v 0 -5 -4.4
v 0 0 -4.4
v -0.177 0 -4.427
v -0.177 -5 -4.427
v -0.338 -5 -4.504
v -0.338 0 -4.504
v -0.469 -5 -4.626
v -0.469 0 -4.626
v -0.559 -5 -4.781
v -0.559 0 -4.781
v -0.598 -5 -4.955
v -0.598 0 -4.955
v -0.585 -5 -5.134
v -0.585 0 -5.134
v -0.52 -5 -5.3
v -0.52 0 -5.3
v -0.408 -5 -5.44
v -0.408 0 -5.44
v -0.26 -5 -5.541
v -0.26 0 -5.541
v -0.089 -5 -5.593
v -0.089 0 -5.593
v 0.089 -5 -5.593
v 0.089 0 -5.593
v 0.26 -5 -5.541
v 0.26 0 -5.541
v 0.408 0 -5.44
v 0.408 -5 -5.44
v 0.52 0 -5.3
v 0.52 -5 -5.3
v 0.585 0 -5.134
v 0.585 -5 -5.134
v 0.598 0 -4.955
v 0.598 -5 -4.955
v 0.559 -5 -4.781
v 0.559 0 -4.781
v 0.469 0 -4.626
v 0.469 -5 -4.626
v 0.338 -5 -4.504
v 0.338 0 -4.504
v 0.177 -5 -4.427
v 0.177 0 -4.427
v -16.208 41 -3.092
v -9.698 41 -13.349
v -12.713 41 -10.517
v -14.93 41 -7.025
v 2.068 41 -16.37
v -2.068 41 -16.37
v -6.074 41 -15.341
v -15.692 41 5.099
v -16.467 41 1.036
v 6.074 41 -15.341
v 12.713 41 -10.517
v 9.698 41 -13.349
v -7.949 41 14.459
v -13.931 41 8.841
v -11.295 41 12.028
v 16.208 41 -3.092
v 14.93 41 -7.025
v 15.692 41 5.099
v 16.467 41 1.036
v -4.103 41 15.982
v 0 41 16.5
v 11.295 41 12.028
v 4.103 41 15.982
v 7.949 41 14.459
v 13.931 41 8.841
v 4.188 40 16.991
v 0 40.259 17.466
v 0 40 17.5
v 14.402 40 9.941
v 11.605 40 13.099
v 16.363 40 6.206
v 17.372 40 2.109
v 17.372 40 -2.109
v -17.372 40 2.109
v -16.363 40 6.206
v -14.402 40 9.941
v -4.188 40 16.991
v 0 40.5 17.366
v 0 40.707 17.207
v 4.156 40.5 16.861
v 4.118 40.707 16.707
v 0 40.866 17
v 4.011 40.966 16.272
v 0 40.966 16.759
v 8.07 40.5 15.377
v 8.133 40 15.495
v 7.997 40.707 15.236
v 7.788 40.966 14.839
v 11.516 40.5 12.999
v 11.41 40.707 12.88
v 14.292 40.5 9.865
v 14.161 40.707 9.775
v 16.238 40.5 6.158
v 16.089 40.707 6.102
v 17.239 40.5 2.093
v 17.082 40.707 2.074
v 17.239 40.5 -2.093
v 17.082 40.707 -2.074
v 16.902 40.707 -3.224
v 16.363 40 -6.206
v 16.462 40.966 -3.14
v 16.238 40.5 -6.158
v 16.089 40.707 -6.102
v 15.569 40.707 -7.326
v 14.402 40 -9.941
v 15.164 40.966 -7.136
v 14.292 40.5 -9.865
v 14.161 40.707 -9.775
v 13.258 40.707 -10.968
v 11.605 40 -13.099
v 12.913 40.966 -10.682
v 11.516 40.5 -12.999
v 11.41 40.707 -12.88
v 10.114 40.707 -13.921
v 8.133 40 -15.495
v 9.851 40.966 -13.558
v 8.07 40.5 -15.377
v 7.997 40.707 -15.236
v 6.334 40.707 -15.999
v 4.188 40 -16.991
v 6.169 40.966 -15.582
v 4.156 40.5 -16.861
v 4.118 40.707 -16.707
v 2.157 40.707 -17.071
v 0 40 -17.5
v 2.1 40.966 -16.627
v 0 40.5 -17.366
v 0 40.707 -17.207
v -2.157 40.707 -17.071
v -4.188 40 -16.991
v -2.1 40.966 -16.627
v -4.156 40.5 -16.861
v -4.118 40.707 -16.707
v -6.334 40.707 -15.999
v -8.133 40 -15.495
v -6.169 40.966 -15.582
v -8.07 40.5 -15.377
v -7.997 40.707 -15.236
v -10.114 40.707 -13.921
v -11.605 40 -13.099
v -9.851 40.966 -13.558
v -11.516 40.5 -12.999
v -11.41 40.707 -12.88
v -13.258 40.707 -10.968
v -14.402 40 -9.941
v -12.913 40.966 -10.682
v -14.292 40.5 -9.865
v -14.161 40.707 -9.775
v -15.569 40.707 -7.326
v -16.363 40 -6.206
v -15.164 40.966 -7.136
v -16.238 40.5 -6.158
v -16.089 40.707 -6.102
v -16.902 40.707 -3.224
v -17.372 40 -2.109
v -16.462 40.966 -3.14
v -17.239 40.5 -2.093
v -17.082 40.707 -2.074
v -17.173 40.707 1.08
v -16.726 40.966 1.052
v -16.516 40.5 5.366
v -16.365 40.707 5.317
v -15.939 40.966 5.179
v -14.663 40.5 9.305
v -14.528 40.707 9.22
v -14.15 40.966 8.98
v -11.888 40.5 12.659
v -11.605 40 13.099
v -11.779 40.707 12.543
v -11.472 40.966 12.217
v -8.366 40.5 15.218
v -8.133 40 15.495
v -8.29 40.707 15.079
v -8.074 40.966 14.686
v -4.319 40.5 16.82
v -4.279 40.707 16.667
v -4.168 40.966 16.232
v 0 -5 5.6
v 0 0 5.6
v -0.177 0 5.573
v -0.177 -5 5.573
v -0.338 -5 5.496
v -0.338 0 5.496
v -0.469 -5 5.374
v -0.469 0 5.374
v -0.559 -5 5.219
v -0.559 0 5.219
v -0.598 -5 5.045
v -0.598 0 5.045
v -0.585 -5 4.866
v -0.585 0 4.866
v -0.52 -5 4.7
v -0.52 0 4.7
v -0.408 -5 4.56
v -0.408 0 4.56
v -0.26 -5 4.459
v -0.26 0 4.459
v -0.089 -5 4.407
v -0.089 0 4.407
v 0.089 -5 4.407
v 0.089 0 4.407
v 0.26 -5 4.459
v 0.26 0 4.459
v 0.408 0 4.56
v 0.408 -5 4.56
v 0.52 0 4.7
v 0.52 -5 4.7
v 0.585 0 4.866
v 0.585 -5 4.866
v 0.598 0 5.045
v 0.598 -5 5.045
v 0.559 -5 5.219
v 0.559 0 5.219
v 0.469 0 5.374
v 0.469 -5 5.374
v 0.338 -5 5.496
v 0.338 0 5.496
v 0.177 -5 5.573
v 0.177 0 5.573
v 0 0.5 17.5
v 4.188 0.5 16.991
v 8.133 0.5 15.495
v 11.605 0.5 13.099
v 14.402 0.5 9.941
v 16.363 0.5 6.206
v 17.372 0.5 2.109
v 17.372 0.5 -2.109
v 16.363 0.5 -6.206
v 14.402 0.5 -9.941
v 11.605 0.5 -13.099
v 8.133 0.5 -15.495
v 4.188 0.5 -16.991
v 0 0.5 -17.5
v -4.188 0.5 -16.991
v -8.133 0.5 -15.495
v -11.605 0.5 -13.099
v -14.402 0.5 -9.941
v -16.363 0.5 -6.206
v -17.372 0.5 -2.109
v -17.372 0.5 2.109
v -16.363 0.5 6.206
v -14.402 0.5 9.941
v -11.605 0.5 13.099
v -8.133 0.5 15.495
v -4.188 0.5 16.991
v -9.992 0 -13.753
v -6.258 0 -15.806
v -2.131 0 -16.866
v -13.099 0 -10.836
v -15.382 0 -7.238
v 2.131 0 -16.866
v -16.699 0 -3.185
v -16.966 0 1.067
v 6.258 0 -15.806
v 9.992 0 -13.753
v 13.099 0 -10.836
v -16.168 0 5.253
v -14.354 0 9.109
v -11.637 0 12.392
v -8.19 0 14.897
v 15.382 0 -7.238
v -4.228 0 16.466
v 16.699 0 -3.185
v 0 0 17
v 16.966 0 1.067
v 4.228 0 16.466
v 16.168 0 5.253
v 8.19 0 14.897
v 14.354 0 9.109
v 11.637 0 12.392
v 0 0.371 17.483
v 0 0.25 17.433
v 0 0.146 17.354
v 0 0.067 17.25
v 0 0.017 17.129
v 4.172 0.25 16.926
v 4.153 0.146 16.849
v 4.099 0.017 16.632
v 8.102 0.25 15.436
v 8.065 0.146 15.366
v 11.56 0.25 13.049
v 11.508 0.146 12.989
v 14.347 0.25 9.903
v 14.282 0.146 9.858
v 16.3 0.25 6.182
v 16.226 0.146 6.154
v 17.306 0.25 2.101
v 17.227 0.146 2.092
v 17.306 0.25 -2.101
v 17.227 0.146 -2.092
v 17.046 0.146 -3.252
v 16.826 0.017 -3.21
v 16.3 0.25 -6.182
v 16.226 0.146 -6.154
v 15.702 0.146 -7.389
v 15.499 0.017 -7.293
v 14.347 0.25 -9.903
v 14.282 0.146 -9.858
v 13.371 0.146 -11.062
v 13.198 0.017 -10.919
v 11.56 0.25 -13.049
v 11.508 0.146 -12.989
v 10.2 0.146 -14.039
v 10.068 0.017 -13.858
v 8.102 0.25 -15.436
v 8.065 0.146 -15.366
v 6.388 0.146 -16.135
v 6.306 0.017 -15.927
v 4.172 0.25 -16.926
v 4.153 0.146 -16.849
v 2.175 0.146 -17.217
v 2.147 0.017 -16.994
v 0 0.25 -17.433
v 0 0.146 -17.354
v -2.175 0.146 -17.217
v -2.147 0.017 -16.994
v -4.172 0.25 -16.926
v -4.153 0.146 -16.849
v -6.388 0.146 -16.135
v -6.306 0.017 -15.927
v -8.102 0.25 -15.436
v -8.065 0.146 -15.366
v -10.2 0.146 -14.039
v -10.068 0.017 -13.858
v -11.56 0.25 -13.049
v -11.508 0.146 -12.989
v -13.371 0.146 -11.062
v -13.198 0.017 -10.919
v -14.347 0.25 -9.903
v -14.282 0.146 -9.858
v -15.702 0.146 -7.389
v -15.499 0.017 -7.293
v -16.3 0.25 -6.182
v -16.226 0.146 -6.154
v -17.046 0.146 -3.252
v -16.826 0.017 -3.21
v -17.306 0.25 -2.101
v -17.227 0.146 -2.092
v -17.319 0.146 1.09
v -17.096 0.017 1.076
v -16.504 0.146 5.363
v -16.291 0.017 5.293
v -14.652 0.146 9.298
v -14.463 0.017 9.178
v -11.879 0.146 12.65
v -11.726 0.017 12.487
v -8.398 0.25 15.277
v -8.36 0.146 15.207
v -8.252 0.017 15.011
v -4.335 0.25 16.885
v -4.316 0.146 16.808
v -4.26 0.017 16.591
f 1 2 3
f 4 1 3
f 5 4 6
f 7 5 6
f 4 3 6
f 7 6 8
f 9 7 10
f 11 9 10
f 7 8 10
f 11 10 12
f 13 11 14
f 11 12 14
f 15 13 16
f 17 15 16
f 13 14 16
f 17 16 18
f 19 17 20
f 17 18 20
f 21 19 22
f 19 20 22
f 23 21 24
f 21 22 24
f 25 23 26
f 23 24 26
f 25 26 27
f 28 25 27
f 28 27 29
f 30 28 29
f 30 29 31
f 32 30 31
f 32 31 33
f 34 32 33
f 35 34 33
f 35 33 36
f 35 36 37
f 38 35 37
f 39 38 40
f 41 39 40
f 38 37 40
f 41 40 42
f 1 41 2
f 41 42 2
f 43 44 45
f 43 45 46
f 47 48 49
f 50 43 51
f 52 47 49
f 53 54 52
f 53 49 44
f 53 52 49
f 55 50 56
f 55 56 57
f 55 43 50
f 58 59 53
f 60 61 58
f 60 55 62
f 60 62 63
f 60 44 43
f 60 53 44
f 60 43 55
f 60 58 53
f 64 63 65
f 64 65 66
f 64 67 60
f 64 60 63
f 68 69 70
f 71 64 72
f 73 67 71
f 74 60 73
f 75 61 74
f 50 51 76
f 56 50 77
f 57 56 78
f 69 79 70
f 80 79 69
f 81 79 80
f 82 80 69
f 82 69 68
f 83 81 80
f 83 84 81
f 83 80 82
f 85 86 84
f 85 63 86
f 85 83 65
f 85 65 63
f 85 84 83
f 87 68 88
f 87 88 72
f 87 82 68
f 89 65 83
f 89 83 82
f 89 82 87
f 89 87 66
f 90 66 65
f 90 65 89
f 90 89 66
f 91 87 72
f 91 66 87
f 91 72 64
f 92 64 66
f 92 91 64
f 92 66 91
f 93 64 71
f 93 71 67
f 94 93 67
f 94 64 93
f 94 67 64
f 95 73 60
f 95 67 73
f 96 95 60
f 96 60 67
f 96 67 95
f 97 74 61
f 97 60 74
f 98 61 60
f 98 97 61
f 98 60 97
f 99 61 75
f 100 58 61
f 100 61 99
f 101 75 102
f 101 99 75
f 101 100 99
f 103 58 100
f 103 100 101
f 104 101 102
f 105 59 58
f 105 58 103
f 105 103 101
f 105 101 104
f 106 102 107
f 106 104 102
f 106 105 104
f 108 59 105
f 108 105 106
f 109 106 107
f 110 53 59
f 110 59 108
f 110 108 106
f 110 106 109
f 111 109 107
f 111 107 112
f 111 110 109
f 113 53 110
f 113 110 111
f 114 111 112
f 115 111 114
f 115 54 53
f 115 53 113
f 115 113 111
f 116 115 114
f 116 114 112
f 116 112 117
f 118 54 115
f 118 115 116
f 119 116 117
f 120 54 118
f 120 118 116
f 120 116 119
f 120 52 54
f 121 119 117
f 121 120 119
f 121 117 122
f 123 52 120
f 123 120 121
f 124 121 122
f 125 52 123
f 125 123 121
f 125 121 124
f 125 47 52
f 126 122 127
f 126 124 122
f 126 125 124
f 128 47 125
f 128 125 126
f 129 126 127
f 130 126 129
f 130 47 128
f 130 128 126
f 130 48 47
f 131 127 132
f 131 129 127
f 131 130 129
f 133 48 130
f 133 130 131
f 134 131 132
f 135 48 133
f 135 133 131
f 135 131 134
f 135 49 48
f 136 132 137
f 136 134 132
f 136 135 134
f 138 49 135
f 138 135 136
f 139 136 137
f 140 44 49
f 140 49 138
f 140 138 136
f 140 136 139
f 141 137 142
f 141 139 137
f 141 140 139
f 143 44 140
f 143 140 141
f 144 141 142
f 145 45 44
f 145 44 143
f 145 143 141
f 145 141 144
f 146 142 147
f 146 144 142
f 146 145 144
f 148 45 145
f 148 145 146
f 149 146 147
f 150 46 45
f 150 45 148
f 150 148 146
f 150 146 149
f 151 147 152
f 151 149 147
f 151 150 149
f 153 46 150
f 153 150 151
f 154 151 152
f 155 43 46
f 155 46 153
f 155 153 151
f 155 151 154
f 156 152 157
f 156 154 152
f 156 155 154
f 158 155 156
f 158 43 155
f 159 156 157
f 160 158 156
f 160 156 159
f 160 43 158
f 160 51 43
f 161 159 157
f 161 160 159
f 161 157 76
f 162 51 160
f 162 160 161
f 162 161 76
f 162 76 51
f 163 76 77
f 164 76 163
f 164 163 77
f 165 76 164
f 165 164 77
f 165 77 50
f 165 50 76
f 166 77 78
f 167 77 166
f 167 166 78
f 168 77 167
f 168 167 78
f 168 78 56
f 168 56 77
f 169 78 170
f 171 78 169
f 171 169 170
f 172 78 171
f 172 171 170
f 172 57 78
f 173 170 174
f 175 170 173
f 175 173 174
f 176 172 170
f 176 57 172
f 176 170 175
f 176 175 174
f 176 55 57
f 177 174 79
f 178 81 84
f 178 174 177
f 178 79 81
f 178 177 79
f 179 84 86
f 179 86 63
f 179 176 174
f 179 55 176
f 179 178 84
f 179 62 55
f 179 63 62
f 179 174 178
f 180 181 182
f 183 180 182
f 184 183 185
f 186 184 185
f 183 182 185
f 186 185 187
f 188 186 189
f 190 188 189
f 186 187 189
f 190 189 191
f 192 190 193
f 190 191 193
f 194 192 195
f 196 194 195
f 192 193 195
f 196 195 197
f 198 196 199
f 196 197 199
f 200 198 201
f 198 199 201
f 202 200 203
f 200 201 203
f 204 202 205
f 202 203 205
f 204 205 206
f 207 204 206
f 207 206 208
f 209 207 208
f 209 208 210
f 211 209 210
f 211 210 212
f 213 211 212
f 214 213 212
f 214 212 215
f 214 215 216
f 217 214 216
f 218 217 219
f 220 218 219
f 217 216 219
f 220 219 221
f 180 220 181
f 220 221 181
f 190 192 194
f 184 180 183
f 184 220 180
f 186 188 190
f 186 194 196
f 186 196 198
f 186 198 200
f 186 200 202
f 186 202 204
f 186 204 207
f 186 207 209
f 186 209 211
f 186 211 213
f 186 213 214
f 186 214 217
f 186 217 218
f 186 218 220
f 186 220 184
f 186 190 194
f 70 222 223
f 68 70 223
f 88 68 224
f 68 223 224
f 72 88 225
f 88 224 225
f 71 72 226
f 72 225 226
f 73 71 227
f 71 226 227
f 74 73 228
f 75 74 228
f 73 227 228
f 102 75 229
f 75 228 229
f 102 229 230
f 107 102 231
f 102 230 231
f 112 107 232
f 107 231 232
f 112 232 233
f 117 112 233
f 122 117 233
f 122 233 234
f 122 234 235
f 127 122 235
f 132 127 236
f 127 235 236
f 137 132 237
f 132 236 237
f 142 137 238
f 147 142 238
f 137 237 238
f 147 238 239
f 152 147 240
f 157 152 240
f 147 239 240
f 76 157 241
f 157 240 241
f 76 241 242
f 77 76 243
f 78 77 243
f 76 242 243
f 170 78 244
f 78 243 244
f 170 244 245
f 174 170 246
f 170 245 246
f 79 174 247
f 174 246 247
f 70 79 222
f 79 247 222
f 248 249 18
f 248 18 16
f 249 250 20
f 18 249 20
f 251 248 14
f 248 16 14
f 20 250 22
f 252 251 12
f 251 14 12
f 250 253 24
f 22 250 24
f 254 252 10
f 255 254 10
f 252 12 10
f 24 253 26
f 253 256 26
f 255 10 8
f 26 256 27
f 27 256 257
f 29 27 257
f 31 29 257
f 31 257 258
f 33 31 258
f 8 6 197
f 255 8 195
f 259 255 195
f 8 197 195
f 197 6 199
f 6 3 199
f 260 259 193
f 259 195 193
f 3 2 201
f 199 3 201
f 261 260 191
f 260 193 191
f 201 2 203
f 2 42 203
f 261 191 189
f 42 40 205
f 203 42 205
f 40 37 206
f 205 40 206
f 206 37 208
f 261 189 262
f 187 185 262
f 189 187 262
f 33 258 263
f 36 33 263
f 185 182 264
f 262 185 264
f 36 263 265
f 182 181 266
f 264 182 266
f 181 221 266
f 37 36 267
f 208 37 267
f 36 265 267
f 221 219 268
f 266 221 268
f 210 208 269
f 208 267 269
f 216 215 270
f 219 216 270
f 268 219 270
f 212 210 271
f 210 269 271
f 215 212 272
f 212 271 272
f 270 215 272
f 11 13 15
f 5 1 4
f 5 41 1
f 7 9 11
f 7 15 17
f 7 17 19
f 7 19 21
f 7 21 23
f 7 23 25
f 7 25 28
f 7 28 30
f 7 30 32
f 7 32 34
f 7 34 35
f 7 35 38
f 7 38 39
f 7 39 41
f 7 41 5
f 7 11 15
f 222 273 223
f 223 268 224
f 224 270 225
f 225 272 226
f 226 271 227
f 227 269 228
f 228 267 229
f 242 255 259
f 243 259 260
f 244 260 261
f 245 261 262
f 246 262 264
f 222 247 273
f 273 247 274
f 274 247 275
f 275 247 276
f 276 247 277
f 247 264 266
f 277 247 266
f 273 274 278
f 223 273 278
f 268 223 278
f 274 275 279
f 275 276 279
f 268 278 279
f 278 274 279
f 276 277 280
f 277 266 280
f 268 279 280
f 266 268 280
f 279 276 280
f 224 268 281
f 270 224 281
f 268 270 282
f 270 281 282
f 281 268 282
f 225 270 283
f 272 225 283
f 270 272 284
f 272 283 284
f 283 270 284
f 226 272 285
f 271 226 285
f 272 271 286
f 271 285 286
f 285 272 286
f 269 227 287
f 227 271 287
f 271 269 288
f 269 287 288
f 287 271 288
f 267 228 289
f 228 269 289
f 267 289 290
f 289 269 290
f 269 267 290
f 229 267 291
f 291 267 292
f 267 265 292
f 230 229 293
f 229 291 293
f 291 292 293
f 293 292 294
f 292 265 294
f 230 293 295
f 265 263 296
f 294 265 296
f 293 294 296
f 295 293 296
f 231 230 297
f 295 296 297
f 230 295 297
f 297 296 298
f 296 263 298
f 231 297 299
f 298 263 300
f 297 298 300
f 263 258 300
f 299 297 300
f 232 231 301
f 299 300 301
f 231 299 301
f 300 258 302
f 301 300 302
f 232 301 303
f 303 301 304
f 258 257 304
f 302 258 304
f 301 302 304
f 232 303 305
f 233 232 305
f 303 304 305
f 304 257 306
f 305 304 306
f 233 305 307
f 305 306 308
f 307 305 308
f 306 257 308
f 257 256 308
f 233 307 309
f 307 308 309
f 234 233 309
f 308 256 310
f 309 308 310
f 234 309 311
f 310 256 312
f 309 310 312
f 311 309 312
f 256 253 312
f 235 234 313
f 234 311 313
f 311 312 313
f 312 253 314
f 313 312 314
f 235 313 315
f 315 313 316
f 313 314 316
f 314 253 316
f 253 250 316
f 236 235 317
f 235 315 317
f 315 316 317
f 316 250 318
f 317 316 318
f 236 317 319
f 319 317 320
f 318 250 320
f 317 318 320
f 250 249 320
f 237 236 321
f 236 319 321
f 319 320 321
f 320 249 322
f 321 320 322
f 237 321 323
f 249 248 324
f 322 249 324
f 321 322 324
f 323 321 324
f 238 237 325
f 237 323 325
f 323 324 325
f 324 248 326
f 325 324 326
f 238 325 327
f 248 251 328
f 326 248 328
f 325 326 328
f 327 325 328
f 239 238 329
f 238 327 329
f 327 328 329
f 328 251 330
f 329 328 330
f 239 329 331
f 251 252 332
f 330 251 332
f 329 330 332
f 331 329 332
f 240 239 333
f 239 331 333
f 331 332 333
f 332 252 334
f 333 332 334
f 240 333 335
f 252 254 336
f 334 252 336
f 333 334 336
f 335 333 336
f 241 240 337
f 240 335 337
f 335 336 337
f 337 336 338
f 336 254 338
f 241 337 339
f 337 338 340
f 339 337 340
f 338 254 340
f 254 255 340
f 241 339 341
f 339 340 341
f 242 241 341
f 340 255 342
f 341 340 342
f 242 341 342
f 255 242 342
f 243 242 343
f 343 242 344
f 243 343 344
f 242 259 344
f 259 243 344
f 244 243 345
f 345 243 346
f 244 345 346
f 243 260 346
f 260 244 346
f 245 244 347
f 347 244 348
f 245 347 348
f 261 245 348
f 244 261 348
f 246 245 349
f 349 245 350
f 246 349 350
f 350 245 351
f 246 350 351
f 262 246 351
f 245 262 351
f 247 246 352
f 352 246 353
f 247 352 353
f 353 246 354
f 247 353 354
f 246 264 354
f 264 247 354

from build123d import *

# Parameters (mm, degrees)
SKETCH1_R           = 17.5
BOSS_EXTRUDE1_DEPTH = 41
FILLET2_R           = 1
SKETCH2_R           = 0.6
BOSS_EXTRUDE2_DEPTH = 5
FILLET3_R           = 0.5


with BuildPart() as part:
    # Sketch1 → Boss-Extrude1 (new body)
    with BuildSketch(Plane(origin=(0, 0, 0), x_dir=(1, 0, 0), z_dir=(0, 1, 0))):
        with Locations(Location((0, 0, 0), (0, 0, 270))):
            Circle(SKETCH1_R)
    extrude(amount=BOSS_EXTRUDE1_DEPTH)

    # Fillet2
    fillet2_edges = [part.edges().sort_by_distance(p)[0] for p in [
        (0, 41, -17.5),
    ]]
    fillet(fillet2_edges, radius=FILLET2_R)

    # Sketch2 → Boss-Extrude2 (add)
    with BuildSketch(Plane.XZ):
        with Locations(Location((0, 5, 0), (0, 0, 90))):
            Circle(SKETCH2_R)
        with Locations(Location((0, -5, 0), (0, 0, 90))):
            Circle(SKETCH2_R)
    extrude(amount=BOSS_EXTRUDE2_DEPTH)

    # Fillet3
    fillet3_edges = [part.edges().sort_by_distance(p)[0] for p in [
        (0, 0, -17.5),
    ]]
    fillet(fillet3_edges, radius=FILLET3_R)


solid = part.part
